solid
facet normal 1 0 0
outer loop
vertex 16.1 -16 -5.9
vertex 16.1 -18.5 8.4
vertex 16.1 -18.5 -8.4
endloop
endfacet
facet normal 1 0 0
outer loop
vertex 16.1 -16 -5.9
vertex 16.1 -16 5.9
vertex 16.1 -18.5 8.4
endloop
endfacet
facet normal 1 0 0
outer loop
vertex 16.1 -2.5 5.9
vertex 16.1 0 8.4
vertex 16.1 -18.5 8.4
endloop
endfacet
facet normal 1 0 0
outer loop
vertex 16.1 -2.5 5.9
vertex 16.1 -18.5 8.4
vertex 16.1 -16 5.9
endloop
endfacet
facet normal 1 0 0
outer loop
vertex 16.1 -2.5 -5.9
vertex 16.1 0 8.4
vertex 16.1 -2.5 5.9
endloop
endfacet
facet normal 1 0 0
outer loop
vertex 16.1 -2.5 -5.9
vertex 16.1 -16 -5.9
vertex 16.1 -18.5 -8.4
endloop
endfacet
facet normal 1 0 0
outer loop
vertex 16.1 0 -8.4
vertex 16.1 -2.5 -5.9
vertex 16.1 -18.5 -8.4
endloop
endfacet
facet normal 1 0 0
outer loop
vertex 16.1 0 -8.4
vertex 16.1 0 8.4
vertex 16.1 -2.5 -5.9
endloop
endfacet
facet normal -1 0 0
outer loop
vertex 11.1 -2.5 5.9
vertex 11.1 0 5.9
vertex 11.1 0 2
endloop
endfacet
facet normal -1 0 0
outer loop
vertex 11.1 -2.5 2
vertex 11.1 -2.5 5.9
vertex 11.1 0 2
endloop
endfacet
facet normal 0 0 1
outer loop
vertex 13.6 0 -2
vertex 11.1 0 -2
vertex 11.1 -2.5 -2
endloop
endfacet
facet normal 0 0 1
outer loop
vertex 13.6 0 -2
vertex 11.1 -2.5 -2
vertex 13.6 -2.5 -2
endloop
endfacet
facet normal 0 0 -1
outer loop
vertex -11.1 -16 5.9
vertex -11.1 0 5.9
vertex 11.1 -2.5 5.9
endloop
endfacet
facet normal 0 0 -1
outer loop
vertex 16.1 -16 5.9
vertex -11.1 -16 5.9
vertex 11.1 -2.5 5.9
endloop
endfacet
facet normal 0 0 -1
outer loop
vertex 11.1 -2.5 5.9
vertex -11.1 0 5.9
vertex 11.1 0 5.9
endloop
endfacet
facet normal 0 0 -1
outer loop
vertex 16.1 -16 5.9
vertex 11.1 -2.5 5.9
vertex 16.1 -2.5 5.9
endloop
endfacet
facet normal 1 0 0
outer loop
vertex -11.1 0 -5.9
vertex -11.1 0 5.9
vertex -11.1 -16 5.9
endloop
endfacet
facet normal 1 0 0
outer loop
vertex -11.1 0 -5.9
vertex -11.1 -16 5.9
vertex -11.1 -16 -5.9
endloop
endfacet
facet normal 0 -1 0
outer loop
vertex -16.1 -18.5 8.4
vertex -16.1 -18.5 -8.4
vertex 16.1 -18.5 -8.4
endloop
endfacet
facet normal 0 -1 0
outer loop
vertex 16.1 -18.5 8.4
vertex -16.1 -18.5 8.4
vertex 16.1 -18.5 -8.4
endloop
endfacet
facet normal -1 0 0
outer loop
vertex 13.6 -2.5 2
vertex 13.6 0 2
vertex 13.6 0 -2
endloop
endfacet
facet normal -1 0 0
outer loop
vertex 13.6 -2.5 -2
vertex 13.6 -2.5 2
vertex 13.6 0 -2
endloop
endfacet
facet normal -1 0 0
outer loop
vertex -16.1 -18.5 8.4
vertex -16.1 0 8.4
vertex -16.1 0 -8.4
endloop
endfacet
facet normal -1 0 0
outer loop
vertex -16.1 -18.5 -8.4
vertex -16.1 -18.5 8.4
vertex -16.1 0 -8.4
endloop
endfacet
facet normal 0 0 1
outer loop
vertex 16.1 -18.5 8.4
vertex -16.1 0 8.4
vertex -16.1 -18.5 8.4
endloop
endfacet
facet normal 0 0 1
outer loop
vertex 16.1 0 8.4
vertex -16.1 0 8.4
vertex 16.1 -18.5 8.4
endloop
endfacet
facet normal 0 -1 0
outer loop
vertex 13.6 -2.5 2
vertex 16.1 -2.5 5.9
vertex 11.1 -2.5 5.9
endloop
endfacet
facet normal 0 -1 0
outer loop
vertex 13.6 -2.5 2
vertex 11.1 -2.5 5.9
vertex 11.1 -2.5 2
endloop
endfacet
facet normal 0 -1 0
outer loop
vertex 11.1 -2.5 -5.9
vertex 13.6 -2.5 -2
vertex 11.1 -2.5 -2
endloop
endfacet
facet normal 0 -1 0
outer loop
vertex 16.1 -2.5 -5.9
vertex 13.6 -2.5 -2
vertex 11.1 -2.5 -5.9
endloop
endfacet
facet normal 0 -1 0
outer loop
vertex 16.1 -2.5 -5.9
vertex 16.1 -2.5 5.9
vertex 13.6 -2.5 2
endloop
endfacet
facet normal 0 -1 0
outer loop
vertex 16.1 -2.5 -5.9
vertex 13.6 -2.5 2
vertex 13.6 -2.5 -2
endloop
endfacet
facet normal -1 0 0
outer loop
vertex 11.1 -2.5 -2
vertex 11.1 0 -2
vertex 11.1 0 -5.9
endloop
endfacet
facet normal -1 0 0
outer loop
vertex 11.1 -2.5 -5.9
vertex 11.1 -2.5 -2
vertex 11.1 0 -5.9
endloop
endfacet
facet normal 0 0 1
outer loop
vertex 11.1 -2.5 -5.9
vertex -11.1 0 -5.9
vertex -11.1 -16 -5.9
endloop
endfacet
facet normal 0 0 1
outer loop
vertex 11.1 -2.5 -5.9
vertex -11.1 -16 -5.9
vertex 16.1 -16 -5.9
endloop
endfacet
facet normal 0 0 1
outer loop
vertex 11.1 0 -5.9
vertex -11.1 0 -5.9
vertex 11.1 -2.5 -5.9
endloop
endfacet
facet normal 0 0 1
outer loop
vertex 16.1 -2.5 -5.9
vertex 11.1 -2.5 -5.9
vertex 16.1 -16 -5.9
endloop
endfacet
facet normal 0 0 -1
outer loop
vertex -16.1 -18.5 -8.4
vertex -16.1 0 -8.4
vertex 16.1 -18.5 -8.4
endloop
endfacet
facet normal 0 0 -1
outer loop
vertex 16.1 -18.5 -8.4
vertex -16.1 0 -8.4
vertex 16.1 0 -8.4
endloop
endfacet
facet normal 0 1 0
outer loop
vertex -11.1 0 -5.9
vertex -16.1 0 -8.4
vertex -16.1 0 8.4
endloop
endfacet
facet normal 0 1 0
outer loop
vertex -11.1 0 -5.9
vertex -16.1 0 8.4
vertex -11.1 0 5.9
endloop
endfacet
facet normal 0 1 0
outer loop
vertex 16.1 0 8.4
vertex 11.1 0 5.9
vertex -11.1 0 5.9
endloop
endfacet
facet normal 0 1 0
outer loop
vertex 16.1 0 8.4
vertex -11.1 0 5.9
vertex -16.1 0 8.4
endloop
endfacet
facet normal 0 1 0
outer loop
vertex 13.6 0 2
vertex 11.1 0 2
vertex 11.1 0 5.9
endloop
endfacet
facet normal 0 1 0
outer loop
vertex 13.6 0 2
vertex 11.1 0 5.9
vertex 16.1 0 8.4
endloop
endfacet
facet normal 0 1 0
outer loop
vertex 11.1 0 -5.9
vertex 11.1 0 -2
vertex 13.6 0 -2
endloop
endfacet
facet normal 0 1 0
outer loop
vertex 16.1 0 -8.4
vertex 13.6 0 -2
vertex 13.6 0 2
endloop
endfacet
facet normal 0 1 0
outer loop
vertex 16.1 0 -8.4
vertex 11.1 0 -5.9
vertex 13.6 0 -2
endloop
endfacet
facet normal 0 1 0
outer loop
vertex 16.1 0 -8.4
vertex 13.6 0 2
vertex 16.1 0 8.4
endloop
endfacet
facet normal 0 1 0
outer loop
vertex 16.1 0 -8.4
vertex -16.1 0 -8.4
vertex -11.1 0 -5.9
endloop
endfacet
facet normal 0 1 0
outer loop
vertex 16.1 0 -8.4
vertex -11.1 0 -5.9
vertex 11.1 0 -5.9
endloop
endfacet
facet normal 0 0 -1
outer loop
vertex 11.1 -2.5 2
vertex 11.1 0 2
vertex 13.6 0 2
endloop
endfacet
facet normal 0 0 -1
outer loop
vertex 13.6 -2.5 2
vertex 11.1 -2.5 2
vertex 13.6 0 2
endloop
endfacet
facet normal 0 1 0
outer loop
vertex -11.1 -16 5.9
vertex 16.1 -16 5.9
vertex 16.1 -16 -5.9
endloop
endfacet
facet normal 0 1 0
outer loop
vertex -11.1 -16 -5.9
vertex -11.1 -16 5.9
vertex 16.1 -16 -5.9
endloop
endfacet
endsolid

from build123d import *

# Parameters (mm, degrees)
SKETCH2_W           = 32.2
SKETCH2_H           = 16.8
BOSS_EXTRUDE1_DEPTH = 18.5
SKETCH3_W           = 22.2
SKETCH3_H           = 11.8
CUT_EXTRUDE1_DEPTH  = 16
SKETCH4_W           = 11.8
SKETCH4_H           = 13.5
CUT_EXTRUDE2_DEPTH  = 5
SKETCH5_W           = 2.5
SKETCH5_H           = 4
CUT_EXTRUDE3_DEPTH  = 2.5


with BuildPart() as part:
    # Sketch2 → Boss-Extrude1 (new body)
    with BuildSketch(Plane(origin=(0, 0, 0), x_dir=(1, 0, 0), z_dir=(0, 1, 0))):
        Rectangle(SKETCH2_W, SKETCH2_H)
    extrude(amount=-BOSS_EXTRUDE1_DEPTH)

    # Sketch3 → Cut-Extrude1 (cut)
    with BuildSketch(Plane(origin=(0, 0, 0), x_dir=(1, 0, 0), z_dir=(0, 1, 0))):
        Rectangle(SKETCH3_W, SKETCH3_H)
    extrude(amount=-CUT_EXTRUDE1_DEPTH, mode=Mode.SUBTRACT)

    # Sketch4 → Cut-Extrude2 (cut)
    with BuildSketch(Plane(origin=(16.1, 0, 0), x_dir=(0, 0, -1), z_dir=(1, 0, 0))):
        with Locations((0, -9.25)):
            Rectangle(SKETCH4_W, SKETCH4_H)
    extrude(amount=-CUT_EXTRUDE2_DEPTH, mode=Mode.SUBTRACT)

    # Sketch5 → Cut-Extrude3 (cut)
    with BuildSketch(Plane(origin=(0, 0, 0), x_dir=(1, 0, 0), z_dir=(0, 1, 0))):
        with Locations((12.35, 0)):
            Rectangle(SKETCH5_W, SKETCH5_H)
    extrude(amount=-CUT_EXTRUDE3_DEPTH, mode=Mode.SUBTRACT)


solid = part.part
